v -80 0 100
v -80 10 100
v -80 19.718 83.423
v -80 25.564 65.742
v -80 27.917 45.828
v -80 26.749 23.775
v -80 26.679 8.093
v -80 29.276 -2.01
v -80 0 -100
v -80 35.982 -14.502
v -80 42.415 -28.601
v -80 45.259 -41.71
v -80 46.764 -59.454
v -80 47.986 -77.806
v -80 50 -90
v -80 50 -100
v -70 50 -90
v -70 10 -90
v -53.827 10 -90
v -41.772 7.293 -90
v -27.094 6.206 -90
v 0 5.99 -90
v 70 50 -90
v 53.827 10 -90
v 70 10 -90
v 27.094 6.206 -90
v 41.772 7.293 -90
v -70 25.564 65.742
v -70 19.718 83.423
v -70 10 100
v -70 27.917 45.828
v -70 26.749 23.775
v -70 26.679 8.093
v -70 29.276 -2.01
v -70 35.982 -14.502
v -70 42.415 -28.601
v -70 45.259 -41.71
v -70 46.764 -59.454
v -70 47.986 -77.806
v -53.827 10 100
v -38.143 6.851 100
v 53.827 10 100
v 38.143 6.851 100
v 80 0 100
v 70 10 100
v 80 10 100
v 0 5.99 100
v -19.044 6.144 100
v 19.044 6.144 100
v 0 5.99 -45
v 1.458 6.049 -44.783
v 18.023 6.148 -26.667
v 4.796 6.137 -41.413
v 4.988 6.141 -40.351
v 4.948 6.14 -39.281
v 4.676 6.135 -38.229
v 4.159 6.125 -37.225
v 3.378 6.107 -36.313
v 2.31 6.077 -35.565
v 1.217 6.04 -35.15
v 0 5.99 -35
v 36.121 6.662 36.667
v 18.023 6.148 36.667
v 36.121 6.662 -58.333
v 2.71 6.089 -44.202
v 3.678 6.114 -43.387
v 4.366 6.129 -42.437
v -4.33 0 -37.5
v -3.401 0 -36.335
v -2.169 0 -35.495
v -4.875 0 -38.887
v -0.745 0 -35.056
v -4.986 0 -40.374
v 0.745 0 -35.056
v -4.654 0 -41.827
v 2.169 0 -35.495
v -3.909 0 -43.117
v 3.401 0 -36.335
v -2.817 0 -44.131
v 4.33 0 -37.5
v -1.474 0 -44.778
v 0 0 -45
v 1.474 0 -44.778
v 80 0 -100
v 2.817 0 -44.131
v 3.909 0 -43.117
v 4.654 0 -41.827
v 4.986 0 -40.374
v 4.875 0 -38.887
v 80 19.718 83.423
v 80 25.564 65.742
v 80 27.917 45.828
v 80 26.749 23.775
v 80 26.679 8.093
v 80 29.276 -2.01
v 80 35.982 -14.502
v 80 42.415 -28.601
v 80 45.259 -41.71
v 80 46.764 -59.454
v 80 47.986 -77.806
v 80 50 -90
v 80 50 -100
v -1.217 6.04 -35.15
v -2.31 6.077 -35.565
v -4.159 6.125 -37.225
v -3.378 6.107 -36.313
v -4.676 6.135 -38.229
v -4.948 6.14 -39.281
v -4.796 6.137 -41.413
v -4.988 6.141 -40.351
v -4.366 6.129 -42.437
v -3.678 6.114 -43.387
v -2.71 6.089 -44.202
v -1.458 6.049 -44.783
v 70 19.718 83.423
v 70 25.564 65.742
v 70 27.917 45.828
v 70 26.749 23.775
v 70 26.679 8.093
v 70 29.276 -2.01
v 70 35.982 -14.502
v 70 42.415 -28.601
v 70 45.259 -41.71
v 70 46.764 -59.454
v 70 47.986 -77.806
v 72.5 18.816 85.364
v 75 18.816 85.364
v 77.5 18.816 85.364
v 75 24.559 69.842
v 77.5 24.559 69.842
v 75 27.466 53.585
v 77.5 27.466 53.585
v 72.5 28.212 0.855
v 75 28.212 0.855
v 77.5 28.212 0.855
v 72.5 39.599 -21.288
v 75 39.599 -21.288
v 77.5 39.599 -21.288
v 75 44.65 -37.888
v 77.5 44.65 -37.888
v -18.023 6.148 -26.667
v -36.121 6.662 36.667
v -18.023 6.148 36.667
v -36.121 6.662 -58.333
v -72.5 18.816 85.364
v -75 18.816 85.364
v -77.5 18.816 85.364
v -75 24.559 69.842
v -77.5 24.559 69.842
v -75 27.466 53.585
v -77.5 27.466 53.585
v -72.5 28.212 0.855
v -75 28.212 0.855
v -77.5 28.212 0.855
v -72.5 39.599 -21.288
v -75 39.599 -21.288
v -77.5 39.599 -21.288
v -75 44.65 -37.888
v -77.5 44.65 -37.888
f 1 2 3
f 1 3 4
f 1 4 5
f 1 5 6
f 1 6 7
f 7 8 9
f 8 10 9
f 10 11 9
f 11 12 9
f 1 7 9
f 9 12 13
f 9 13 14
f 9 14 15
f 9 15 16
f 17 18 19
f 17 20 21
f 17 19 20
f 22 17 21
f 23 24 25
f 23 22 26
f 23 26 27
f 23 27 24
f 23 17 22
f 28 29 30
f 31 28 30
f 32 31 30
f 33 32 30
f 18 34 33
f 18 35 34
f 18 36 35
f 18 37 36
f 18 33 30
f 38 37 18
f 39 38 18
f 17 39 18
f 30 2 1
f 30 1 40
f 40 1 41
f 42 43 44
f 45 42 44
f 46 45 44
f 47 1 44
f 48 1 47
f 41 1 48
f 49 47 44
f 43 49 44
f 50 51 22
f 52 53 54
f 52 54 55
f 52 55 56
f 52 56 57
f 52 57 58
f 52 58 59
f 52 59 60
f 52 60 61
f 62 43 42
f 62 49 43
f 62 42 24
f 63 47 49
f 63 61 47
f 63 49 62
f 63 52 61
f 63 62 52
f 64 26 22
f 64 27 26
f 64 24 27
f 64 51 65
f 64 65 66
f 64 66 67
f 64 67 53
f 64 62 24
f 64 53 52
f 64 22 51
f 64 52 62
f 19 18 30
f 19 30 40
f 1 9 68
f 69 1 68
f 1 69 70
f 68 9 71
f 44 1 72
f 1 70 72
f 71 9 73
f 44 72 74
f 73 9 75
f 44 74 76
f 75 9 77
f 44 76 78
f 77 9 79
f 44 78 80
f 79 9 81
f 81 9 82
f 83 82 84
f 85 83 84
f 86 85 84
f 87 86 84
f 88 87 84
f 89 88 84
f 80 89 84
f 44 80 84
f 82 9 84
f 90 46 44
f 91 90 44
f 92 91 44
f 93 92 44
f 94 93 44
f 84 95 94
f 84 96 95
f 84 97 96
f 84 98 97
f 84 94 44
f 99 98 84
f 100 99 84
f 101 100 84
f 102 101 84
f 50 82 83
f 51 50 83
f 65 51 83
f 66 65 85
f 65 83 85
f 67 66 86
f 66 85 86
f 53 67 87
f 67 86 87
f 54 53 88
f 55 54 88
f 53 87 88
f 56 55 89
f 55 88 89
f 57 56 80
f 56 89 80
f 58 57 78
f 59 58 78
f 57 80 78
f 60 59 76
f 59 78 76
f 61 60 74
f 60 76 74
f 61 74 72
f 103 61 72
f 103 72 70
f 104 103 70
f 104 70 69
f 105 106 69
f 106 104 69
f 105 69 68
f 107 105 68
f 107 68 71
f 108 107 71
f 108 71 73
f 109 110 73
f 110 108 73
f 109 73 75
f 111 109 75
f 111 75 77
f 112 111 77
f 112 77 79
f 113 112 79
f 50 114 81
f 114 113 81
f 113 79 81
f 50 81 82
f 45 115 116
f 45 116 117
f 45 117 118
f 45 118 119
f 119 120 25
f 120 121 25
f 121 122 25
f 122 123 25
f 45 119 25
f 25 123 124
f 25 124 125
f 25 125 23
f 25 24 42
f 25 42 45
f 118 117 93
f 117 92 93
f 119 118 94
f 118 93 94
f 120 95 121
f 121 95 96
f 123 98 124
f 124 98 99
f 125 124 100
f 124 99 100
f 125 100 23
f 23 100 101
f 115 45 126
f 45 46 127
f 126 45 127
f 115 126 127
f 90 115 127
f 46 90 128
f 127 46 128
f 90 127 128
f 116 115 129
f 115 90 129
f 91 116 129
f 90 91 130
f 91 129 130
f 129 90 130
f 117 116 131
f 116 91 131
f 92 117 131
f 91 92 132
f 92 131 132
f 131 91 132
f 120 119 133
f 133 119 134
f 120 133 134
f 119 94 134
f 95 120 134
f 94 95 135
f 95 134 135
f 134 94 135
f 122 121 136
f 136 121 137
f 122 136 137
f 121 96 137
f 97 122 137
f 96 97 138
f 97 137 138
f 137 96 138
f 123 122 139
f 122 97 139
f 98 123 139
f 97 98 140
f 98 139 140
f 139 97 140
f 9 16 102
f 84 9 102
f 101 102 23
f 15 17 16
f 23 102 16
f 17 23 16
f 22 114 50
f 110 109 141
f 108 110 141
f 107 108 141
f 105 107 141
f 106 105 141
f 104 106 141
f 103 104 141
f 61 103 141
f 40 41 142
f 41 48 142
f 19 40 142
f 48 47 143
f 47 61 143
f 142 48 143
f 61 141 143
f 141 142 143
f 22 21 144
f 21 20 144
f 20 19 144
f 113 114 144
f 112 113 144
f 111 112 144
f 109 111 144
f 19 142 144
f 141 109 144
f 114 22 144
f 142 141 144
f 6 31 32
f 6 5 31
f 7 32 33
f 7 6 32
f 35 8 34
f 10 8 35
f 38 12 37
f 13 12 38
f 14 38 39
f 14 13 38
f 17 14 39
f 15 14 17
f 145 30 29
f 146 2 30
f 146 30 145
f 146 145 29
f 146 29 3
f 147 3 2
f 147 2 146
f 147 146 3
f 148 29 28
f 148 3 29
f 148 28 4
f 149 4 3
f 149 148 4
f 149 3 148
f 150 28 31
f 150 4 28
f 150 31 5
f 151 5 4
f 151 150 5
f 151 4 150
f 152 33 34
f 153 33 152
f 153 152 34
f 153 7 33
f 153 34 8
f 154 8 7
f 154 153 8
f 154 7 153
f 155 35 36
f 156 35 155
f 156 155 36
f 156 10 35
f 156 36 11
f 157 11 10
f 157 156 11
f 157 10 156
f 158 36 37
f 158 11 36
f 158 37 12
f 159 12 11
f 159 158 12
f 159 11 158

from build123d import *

# Parameters (mm, degrees)
CROQUIS2_W              = 160
CROQUIS2_H              = 200
SALIENTE_EXTRUIR1_DEPTH = 10
CORTAR_EXTRUIR1_DEPTH   = 216.638586528
SALIENTE_EXTRUIR2_DEPTH = 10
SALIENTE_EXTRUIR3_DEPTH = 10
CROQUIS6_R              = 5
CORTAR_EXTRUIR2_DEPTH   = 138.477271016


with BuildPart() as part:
    # Croquis2 → Saliente-Extruir1 (new body)
    with BuildSketch(Plane(origin=(0, 0, 0), x_dir=(1, 0, 0), z_dir=(0, 1, 0))):
        Rectangle(CROQUIS2_W, CROQUIS2_H)
    extrude(amount=SALIENTE_EXTRUIR1_DEPTH)

    # Croquis3 → Cortar-Extruir1 (cut, through all)
    with BuildSketch(Plane.XY.offset(100)):
        with BuildLine():
            Line((-53.826836436, 10), (53.826836436, 10))
            add(Edge.make_bspline(
                [(53.826836436, 10), (36.473349227, 4.426622659), (17.82847287, 6.792306247), (0, 5.99040599)],
                knots=[0, 0, 0, 0, 1, 1, 1, 1], degree=3))
            add(Edge.make_bspline(
                [(-53.826836436, 10), (-36.473349227, 4.426622659), (-17.82847287, 6.792306247), (0, 5.99040599)],
                knots=[0, 0, 0, 0, 1, 1, 1, 1], degree=3))
        make_face()
    extrude(amount=-CORTAR_EXTRUIR1_DEPTH, mode=Mode.SUBTRACT)

    # Croquis4 → Saliente-Extruir2 (add)
    with BuildSketch(Plane(origin=(0, 0, -100), x_dir=(-1, 0, 0), z_dir=(0, 0, -1))):
        Polygon((-80, 10), (-80, 50), (80, 50), (80, 10), (80, 0), (-80, 0), align=None)
    extrude(amount=-SALIENTE_EXTRUIR2_DEPTH)

    # Croquis5 → Saliente-Extruir3 (add)
    with BuildSketch(Plane(origin=(80, 0, 0), x_dir=(0, 0, -1), z_dir=(1, 0, 0))):
        with BuildLine():
            Line((-100, 10), (90, 10))
            Line((90, 10), (90, 50))
            add(Edge.make_bspline(
                [(-100, 10), (-81.144129562, 23.909799652), (-47.883162984, 31.722955742), (-3.174822516, 22.923773002), (33.108941454, 51.133009448), (68.371145219, 44.780803963), (90, 50)],
                knots=[0, 0, 0, 0, 0.338396357, 0.520485989, 0.646796106, 1, 1, 1, 1], degree=3))
        make_face()
    saliente_extruir3 = extrude(amount=-SALIENTE_EXTRUIR3_DEPTH)

    # Simetría1: Saliente-Extruir3 across plane
    add(saliente_extruir3.mirror(Plane(origin=(0, 0, 0), x_dir=(0, 0, 1), z_dir=(1, 0, 0))))

    # Croquis6 → Cortar-Extruir2 (cut, through all)
    with BuildSketch(Plane.XZ):
        with Locations(Location((0, -40, 0), (0, 0, 270))):
            Circle(CROQUIS6_R)
    extrude(amount=-CORTAR_EXTRUIR2_DEPTH, mode=Mode.SUBTRACT)


solid = part.part
